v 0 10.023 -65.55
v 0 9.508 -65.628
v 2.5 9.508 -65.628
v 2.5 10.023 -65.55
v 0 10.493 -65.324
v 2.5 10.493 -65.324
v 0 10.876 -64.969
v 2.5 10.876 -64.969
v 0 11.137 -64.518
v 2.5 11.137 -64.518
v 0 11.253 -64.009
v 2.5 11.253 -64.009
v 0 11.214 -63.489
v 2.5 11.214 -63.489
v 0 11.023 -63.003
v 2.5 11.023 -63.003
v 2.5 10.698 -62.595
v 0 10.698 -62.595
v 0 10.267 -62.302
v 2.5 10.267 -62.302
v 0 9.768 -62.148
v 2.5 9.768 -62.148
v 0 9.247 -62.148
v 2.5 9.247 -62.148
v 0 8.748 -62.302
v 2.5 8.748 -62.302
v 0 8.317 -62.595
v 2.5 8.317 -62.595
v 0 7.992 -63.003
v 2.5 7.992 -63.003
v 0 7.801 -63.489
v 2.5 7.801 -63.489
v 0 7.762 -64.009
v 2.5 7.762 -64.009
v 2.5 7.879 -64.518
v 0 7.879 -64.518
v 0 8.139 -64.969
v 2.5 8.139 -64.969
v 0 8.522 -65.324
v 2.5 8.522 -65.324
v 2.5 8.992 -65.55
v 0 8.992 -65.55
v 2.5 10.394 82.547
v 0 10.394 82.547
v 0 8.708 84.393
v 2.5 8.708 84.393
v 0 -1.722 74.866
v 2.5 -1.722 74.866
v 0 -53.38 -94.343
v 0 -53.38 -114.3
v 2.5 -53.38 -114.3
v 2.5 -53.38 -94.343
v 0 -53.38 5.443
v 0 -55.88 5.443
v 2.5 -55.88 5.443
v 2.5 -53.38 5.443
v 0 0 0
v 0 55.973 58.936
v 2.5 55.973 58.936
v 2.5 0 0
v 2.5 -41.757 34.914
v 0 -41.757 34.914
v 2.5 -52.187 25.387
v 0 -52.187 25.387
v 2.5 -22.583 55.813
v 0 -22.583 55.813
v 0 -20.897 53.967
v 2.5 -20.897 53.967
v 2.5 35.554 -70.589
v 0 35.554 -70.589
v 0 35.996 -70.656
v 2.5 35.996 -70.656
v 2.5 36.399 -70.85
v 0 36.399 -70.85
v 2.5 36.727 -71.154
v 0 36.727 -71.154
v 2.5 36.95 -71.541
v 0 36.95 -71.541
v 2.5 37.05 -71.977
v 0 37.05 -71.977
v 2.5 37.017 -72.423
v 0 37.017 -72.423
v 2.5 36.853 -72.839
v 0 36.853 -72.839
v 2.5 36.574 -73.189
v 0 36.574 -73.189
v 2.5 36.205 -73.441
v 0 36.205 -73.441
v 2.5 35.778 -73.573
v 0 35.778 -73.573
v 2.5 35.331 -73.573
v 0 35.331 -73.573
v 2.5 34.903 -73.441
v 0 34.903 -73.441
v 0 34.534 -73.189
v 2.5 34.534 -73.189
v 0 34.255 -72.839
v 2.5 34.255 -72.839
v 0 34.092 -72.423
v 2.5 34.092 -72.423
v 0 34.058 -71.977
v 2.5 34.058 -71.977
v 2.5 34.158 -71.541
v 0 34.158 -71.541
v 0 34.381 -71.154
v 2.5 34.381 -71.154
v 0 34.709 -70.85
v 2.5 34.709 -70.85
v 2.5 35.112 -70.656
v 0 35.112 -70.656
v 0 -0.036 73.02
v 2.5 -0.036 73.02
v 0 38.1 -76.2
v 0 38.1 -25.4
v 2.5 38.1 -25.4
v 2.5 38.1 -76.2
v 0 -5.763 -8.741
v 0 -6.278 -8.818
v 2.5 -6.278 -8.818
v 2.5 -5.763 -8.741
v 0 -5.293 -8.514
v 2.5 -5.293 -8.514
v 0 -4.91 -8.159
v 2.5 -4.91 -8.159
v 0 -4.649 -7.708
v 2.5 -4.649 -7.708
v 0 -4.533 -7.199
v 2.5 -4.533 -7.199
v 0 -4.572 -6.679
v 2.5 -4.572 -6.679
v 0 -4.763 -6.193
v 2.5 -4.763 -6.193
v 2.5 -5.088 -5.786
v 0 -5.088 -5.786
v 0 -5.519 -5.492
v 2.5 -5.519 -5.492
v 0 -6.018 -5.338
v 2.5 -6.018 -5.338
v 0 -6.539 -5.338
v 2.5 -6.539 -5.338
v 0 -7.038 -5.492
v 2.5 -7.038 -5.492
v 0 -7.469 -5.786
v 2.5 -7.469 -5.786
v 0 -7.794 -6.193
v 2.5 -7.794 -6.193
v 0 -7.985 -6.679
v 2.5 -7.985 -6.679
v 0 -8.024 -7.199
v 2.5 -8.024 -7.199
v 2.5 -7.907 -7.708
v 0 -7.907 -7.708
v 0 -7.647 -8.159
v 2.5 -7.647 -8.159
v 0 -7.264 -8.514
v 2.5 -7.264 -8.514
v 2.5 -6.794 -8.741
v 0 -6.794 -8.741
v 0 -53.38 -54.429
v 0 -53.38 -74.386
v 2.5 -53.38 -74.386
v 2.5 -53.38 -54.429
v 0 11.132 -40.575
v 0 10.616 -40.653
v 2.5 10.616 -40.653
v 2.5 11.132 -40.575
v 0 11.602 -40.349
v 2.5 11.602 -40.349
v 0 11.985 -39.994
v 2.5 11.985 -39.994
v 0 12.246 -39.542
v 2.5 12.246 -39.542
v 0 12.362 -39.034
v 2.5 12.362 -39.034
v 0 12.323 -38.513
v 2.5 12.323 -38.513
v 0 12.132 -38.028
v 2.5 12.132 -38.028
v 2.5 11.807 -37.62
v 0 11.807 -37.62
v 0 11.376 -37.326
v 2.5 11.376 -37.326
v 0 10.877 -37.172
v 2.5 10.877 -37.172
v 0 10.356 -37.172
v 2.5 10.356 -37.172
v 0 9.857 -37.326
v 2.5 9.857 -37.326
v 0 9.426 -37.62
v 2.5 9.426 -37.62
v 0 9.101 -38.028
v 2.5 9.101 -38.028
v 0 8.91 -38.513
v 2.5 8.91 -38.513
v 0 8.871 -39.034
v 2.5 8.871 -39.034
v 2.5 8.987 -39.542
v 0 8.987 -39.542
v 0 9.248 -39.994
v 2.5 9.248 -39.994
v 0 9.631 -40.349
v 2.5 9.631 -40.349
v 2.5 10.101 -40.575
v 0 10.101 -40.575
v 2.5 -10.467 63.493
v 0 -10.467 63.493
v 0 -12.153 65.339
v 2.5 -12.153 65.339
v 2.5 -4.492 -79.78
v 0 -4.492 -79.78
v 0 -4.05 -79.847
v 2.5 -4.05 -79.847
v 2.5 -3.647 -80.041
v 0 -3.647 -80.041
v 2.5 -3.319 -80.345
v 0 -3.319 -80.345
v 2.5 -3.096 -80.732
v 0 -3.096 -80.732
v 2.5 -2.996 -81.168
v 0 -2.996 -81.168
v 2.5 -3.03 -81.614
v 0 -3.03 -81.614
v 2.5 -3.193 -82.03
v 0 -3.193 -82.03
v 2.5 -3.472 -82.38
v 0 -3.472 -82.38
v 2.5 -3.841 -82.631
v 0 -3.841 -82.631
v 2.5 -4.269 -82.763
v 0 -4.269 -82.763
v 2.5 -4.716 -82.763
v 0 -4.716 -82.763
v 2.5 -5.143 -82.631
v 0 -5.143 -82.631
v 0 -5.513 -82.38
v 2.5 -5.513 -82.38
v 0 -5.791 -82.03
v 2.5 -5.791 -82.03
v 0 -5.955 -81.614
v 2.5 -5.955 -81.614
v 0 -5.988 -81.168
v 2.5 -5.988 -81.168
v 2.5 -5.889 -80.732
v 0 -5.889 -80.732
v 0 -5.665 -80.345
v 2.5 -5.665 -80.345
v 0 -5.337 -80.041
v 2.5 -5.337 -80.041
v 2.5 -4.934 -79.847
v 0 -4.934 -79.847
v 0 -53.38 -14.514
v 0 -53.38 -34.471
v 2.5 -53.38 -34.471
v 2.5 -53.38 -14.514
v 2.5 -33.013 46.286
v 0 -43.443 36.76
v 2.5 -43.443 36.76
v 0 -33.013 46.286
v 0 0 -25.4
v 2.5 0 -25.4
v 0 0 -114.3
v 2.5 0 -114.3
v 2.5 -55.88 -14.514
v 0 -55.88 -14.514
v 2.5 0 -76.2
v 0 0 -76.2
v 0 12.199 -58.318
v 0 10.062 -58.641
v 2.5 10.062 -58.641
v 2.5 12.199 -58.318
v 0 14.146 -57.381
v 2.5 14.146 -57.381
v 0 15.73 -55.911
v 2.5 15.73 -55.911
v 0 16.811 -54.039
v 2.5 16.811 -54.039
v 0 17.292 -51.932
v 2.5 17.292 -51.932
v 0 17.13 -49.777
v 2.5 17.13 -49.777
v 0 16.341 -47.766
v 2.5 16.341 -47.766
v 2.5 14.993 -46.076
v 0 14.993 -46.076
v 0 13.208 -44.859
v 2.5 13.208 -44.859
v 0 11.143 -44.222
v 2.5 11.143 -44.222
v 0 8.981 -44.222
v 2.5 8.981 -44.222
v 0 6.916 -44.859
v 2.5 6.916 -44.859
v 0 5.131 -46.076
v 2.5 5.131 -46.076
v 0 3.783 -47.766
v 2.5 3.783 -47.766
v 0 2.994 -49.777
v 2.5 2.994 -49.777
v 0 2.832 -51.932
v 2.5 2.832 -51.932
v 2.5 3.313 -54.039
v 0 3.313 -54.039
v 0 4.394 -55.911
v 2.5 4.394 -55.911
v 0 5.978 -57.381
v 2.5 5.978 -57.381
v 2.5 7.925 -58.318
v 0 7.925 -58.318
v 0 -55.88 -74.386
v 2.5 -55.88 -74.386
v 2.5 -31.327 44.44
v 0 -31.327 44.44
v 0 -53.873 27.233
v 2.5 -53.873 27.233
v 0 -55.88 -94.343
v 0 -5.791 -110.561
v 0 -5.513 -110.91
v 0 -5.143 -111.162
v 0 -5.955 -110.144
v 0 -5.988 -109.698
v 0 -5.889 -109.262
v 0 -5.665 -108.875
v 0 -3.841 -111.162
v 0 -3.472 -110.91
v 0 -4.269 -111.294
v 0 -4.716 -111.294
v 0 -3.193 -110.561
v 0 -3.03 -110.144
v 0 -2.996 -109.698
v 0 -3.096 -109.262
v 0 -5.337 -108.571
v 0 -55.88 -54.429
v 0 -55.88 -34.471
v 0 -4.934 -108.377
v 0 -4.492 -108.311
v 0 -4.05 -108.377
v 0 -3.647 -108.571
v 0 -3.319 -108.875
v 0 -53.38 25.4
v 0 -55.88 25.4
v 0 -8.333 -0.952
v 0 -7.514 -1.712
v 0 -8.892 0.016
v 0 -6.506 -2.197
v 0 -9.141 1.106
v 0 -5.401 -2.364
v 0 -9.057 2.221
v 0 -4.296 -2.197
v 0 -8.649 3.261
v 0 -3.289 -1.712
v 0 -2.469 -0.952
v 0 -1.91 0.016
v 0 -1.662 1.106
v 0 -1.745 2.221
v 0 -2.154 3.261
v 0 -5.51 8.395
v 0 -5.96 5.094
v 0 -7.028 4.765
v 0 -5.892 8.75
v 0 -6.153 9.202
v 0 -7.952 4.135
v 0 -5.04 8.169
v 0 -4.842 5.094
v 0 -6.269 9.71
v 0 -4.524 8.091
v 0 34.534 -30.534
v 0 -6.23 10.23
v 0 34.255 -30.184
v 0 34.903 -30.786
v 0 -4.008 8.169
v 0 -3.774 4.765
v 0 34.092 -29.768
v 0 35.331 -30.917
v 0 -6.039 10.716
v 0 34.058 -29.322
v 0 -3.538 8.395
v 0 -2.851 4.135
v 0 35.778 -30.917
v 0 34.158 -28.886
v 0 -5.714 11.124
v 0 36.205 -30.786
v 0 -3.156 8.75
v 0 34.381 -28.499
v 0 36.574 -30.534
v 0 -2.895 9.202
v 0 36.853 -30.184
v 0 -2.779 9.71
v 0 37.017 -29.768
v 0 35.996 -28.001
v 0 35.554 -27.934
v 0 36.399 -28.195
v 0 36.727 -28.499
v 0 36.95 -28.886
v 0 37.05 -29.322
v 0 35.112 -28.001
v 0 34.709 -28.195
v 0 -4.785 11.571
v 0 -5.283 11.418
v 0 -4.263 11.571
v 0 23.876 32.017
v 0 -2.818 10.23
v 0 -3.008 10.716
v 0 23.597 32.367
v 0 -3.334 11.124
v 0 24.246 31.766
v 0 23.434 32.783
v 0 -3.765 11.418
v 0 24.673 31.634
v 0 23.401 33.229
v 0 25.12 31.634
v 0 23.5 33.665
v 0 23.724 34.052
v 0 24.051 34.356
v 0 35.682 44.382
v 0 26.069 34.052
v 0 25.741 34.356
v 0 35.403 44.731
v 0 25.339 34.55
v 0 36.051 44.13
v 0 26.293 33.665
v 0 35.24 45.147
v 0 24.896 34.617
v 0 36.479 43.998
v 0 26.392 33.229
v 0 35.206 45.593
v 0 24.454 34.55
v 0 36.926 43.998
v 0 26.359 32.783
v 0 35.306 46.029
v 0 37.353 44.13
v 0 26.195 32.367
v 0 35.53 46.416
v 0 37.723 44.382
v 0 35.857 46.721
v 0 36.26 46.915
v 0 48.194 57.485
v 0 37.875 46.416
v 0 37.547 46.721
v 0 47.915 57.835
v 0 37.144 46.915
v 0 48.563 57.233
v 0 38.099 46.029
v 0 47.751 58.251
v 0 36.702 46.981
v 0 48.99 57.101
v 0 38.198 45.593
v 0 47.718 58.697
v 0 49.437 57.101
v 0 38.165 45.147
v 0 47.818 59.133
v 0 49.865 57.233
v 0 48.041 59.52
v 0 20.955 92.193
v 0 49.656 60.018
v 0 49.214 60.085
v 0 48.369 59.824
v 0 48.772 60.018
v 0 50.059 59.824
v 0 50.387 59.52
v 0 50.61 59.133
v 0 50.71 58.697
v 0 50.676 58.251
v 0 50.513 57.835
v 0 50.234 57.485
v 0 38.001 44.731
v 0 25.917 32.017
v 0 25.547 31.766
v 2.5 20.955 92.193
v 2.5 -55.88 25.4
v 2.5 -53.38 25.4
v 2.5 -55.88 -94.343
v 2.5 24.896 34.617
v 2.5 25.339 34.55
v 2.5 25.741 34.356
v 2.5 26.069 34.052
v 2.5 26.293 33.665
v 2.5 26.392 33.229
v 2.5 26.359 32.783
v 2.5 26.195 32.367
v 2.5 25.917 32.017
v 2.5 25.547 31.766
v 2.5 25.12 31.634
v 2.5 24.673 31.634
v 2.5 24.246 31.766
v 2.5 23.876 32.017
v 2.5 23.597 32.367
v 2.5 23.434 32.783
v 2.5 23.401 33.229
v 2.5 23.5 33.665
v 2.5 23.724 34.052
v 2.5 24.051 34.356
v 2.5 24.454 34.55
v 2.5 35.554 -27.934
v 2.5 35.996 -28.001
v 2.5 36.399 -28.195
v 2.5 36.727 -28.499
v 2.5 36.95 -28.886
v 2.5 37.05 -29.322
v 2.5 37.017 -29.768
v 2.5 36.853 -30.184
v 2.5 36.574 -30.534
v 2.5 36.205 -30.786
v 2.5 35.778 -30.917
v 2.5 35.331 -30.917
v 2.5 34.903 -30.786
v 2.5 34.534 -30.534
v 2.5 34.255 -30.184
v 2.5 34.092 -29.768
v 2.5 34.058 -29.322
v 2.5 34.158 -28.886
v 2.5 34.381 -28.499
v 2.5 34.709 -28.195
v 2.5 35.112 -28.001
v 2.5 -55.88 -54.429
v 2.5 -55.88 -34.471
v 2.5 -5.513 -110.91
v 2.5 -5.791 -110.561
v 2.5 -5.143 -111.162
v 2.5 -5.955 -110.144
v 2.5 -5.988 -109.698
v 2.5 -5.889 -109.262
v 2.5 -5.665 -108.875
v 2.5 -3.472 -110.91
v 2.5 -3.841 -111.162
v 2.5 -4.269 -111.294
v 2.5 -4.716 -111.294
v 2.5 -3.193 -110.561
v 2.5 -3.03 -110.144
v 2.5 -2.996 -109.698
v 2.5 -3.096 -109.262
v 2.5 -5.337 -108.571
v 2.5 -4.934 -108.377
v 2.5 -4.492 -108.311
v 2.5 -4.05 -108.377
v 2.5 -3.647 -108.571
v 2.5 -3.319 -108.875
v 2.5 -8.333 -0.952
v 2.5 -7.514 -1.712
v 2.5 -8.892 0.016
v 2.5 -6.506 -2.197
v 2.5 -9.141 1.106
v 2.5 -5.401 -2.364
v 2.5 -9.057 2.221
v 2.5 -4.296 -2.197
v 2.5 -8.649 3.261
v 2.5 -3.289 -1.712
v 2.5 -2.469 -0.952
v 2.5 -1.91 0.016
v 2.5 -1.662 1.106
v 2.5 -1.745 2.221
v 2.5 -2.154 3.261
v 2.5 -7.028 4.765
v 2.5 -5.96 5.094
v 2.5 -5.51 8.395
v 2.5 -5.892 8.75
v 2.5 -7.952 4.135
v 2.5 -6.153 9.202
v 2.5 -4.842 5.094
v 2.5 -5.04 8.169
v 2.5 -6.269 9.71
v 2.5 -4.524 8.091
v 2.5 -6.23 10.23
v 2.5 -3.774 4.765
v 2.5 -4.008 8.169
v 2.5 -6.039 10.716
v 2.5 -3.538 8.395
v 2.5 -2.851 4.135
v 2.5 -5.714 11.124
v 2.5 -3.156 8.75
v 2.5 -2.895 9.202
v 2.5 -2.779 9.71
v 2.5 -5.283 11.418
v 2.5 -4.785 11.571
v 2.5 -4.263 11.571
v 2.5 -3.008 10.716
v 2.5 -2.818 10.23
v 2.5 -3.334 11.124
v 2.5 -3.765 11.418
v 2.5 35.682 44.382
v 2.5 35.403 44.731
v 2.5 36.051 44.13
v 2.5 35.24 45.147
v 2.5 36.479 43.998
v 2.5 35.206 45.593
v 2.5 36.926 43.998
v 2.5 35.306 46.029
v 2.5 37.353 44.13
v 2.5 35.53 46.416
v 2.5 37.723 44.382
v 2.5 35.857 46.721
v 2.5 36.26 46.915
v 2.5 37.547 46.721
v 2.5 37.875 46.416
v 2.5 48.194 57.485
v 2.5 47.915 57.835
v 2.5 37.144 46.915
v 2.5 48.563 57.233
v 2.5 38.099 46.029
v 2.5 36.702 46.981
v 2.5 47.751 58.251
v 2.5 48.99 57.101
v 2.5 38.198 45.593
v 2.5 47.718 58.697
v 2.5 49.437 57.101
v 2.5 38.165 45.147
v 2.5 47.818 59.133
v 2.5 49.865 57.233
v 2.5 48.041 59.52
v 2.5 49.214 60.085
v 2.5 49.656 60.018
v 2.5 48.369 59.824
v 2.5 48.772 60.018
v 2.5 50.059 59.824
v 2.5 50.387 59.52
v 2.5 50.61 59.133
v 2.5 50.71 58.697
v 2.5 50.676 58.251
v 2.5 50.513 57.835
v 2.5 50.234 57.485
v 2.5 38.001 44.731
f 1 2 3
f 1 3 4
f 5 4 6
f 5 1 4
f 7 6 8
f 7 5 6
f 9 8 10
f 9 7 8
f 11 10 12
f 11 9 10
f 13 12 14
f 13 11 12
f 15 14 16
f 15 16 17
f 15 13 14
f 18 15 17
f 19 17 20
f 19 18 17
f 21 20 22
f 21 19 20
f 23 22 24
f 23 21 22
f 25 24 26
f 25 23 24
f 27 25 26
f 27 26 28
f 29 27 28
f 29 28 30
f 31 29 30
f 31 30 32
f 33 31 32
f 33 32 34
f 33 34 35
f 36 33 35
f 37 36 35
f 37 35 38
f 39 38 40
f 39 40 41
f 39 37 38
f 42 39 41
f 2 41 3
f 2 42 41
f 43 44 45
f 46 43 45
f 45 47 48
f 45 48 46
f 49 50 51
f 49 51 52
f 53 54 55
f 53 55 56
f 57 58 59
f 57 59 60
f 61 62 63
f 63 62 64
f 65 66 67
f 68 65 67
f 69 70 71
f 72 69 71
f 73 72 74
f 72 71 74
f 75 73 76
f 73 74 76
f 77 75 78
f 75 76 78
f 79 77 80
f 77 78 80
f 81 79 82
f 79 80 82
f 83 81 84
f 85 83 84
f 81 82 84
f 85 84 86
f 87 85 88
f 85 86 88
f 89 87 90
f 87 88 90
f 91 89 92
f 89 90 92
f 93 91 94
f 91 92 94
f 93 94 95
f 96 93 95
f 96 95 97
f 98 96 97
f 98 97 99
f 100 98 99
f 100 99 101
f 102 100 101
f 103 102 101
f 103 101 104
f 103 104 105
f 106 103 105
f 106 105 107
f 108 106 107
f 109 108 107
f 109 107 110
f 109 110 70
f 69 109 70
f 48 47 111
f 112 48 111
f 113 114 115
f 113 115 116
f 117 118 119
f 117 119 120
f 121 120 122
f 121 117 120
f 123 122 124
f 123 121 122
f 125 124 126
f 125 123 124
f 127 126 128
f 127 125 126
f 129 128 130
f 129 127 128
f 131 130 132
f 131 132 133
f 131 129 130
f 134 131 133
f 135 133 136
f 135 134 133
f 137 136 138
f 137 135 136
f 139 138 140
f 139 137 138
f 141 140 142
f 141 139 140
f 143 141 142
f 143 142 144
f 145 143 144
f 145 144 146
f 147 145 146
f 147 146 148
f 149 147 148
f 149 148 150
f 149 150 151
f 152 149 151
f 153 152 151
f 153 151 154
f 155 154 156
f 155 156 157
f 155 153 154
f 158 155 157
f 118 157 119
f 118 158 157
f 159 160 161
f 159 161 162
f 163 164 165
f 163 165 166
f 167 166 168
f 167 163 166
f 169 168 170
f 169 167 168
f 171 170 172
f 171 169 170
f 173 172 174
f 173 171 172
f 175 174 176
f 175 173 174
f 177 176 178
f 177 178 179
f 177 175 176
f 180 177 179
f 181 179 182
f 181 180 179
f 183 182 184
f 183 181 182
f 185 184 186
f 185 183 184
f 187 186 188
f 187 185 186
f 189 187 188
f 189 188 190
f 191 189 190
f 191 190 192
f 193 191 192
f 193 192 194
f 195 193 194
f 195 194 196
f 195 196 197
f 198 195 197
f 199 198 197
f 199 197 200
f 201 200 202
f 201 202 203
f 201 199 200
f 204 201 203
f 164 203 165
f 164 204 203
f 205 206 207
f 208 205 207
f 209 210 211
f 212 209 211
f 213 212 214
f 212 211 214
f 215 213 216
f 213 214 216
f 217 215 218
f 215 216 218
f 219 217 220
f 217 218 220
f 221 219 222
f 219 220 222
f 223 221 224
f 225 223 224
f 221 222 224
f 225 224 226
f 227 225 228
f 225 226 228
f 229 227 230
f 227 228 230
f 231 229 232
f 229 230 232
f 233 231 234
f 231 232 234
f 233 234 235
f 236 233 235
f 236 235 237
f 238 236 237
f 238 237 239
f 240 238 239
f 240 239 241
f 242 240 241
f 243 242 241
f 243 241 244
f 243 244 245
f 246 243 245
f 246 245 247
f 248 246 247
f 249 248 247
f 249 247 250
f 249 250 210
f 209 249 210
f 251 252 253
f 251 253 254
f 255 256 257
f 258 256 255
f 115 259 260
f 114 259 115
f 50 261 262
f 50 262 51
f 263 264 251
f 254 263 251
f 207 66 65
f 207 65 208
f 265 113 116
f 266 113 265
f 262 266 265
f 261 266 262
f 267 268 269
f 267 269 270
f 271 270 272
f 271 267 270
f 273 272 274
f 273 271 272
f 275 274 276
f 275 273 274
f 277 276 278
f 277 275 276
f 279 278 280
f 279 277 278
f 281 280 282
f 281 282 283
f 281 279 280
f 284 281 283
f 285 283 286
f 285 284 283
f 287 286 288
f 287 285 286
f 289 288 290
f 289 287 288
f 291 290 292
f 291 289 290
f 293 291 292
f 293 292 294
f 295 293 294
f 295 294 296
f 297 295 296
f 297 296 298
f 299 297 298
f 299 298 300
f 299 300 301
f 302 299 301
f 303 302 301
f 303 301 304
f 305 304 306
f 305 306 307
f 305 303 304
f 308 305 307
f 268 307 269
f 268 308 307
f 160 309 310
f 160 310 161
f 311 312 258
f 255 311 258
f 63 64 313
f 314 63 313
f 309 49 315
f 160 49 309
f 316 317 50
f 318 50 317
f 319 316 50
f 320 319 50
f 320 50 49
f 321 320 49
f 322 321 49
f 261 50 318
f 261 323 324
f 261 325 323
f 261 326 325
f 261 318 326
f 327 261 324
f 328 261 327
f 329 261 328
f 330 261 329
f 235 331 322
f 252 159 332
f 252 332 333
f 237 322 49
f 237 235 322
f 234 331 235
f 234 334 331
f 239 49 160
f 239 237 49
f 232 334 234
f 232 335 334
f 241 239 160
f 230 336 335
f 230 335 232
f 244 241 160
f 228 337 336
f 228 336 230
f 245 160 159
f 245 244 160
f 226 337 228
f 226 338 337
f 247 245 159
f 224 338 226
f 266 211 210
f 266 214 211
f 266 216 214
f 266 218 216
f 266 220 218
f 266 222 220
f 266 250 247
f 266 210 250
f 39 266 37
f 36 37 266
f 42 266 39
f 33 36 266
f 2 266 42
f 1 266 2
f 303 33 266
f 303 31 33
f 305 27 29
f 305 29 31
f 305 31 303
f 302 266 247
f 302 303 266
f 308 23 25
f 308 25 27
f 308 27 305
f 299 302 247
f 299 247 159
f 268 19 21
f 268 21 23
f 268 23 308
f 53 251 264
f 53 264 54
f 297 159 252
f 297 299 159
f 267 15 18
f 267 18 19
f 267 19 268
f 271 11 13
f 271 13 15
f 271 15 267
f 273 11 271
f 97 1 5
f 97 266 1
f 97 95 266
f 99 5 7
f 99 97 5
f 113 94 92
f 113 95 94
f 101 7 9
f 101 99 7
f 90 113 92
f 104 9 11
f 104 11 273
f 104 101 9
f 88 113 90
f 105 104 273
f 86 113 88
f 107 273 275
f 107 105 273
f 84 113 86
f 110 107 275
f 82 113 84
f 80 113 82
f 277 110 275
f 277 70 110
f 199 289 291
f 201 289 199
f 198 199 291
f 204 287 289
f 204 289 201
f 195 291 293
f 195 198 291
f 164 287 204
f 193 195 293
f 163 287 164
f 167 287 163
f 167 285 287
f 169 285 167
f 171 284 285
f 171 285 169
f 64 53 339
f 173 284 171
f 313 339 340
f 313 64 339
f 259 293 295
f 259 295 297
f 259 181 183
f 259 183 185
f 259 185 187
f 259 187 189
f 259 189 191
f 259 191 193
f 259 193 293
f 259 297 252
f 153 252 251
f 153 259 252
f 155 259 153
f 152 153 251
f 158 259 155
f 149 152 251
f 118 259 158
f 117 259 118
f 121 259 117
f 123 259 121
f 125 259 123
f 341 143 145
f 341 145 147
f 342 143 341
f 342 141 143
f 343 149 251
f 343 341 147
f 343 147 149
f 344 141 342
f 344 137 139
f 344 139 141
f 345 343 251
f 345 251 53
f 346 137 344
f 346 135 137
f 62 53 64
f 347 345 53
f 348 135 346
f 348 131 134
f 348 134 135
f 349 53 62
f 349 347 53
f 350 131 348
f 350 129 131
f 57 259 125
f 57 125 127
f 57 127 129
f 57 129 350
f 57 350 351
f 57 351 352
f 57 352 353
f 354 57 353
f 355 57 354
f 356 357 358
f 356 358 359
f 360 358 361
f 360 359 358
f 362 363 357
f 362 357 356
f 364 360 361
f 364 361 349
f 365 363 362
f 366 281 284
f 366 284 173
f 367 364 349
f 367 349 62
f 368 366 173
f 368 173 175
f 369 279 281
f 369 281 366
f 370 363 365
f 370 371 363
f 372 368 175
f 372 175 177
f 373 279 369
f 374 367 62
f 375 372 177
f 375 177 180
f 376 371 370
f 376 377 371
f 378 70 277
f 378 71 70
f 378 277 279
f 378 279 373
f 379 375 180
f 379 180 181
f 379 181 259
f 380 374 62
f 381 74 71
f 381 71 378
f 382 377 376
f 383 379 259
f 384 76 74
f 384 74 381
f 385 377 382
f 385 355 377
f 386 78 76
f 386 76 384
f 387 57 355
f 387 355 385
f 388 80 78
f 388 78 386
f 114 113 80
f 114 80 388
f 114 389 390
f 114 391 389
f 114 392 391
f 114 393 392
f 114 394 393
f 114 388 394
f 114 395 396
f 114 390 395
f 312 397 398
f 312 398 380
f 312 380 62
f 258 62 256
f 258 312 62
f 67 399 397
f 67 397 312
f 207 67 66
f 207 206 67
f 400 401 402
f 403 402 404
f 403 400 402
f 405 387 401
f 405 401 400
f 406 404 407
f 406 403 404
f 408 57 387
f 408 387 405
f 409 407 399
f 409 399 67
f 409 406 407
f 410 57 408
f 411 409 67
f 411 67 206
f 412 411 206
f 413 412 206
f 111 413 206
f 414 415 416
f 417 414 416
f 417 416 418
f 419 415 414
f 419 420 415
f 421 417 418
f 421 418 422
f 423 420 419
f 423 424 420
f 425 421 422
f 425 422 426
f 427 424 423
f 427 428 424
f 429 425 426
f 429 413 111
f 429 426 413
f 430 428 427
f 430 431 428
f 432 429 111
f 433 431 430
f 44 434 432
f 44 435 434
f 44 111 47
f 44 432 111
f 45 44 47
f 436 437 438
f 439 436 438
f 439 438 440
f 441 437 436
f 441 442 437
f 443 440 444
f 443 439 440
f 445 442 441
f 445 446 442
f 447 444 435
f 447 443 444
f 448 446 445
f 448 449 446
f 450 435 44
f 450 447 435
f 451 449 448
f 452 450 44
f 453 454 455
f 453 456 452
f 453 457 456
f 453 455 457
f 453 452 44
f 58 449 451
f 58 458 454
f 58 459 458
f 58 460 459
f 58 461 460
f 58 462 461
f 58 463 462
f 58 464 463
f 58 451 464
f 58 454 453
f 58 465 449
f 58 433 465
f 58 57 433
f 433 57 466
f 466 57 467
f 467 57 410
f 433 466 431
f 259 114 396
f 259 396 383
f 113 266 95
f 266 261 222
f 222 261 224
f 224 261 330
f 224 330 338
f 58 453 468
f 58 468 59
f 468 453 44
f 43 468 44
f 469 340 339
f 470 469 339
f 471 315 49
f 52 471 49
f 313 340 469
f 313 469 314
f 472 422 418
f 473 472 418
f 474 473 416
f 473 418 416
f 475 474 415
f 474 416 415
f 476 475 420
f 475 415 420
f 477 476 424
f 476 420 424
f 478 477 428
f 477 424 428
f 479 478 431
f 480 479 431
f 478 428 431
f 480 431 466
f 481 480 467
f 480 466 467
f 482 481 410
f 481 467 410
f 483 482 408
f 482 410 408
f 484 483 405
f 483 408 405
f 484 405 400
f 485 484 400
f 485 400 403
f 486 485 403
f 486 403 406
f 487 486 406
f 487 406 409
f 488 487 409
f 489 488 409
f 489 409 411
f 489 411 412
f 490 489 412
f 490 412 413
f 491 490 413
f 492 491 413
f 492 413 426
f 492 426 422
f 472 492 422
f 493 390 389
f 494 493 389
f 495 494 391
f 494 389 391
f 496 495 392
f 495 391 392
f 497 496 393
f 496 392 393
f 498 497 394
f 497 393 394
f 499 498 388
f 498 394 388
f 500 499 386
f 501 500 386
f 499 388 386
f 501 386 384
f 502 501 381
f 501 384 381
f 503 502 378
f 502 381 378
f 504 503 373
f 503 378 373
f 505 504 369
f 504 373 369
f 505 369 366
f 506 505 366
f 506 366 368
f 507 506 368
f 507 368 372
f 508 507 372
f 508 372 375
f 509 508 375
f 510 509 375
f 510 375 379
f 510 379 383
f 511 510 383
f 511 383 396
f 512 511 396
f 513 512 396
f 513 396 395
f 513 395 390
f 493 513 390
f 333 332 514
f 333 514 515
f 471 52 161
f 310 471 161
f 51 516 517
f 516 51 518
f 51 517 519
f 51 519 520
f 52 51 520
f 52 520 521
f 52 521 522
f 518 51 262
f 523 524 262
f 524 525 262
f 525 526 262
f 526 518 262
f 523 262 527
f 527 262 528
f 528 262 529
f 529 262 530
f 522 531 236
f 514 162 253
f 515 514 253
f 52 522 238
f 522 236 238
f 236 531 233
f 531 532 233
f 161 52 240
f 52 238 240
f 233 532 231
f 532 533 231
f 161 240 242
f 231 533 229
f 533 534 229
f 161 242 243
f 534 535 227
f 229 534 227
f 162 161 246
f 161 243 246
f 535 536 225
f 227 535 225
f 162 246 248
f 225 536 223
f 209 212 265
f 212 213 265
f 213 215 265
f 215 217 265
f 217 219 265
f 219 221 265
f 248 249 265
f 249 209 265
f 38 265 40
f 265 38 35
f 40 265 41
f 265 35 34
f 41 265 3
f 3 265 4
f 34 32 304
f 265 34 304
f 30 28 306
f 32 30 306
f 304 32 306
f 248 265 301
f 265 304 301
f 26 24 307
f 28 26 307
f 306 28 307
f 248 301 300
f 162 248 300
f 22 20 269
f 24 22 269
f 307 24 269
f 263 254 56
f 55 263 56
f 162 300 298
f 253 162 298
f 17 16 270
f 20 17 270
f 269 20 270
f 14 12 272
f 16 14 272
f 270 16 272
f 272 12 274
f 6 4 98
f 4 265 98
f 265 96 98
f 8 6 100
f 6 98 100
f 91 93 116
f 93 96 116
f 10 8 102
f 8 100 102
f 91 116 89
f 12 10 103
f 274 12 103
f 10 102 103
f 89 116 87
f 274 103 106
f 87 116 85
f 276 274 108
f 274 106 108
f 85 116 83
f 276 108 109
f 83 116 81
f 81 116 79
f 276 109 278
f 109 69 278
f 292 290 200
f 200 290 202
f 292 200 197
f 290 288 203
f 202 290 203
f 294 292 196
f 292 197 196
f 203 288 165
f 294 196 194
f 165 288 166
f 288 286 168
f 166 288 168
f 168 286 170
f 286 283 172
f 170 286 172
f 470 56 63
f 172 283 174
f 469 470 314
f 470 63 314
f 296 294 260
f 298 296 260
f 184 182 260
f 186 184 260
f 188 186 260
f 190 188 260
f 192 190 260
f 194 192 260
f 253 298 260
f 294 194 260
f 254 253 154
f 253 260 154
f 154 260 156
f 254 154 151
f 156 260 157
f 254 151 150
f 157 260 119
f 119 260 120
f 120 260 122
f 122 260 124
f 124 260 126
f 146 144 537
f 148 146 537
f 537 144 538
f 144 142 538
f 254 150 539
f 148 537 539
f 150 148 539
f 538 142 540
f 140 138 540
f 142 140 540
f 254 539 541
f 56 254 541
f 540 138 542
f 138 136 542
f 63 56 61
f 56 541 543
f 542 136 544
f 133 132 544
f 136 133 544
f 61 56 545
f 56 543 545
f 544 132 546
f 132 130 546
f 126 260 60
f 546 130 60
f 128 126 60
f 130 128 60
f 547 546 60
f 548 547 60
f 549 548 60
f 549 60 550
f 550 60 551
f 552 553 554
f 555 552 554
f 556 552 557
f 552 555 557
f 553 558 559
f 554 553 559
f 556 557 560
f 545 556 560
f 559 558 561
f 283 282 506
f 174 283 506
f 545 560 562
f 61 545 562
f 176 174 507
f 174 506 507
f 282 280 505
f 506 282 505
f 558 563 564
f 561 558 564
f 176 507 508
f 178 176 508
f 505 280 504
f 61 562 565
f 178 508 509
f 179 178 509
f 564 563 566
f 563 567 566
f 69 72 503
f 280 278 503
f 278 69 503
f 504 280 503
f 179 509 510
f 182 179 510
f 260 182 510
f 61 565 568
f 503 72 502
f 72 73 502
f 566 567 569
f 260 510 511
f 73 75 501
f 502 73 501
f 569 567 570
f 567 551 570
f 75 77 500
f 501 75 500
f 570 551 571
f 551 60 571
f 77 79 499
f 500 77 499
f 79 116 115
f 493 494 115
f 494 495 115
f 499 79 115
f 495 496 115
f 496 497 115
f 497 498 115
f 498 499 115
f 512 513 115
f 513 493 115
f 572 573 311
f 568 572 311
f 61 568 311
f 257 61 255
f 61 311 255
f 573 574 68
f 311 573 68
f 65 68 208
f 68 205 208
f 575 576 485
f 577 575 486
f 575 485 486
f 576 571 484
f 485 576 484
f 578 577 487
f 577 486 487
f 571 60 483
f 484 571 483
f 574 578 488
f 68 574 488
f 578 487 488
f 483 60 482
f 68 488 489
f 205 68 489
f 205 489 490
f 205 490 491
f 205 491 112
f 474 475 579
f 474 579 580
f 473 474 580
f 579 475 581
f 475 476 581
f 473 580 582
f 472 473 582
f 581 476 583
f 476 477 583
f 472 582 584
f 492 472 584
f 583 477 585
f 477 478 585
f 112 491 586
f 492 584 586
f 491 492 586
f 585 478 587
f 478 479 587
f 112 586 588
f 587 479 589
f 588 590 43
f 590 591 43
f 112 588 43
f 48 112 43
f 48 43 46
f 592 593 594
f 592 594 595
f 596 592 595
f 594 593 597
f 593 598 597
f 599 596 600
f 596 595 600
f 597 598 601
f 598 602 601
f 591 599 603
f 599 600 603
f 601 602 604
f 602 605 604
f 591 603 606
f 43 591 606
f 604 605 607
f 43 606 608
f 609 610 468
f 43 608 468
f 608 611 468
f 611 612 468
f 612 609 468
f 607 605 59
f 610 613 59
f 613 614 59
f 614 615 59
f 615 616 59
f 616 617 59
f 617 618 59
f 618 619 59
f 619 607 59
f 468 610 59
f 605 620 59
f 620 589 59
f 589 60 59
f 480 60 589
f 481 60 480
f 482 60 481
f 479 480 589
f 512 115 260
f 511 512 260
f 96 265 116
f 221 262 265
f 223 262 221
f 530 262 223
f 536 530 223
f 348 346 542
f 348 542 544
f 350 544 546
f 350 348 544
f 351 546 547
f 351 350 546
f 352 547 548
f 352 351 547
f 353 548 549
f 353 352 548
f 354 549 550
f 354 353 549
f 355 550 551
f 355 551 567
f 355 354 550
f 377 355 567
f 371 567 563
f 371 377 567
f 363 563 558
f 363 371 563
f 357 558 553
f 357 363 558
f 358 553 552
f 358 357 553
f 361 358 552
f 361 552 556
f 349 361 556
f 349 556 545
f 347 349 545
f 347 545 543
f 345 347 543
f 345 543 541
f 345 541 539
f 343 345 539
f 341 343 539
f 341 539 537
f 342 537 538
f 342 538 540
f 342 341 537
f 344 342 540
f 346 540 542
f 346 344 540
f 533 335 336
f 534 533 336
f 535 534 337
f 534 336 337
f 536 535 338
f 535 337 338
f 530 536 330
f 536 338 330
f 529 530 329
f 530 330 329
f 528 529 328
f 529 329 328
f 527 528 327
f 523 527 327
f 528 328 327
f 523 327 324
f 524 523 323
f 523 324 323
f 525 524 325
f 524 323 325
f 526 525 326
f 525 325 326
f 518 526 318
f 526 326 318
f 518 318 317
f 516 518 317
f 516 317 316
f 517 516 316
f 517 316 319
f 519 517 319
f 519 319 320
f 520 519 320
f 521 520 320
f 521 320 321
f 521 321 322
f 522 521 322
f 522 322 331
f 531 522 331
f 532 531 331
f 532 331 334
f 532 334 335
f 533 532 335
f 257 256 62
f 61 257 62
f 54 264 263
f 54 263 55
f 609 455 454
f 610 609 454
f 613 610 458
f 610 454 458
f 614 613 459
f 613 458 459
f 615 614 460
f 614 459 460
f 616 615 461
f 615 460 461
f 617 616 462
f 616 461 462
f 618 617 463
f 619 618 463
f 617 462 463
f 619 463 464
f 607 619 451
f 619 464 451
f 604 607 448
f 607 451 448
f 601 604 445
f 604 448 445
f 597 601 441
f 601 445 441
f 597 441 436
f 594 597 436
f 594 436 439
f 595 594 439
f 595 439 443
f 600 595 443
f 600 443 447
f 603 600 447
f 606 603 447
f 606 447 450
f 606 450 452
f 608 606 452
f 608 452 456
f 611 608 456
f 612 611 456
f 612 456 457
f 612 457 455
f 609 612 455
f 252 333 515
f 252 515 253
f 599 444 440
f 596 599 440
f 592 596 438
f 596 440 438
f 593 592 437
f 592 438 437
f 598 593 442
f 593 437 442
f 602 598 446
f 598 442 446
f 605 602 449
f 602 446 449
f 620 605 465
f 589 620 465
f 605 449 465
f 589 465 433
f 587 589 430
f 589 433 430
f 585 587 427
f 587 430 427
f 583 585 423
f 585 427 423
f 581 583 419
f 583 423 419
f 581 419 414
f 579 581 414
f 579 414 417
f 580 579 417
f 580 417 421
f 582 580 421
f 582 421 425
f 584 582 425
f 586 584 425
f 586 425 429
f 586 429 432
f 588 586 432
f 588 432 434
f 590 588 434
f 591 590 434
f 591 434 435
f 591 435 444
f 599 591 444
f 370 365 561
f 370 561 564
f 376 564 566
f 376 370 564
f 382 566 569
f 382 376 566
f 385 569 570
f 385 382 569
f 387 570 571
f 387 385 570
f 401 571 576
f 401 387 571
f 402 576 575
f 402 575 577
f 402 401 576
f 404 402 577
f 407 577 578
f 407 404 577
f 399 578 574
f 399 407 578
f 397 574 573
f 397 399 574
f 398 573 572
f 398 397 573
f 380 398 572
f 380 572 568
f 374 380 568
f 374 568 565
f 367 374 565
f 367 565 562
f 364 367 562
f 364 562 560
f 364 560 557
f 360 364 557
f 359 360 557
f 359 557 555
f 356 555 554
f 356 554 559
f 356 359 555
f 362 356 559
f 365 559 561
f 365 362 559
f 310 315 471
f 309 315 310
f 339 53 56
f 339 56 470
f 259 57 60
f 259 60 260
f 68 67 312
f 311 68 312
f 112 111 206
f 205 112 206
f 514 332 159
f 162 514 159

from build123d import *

# Parameters (mm, degrees)
SKETCH1_R           = 1.75
SKETCH1_R_2         = 3.75
SKETCH1_R_3         = 7.25
BOSS_EXTRUDE1_DEPTH = 2.5
SKETCH2_R           = 1.5
CUT_EXTRUDE1_DEPTH  = 45.72
SKETCH3_W           = 19.957142857
SKETCH3_H           = 2.5
CUT_EXTRUDE2_DEPTH  = 2.54
CUT_EXTRUDE3_DEPTH  = 2.54


with BuildPart() as part:
    # Sketch1 → Boss-Extrude1 (new body)
    with BuildSketch(Plane(origin=(0, 0, 0), x_dir=(0, 0, -1), z_dir=(1, 0, 0))):
        Polygon((0, 0), (25.4, 0), (25.4, 38.1), (76.2, 38.1), (76.2, 0), (114.3, 0), (114.3, -55.88), (-25.4, -55.88), (-93.919230144, 19.137831884), (-58.936151167, 55.972926363), align=None)
        with Locations((-9.840865869, -4.523881045)):
            Circle(SKETCH1_R, mode=Mode.SUBTRACT)
        with Locations((-1.386257564, -5.40114863)):
            Circle(SKETCH1_R_2, mode=Mode.SUBTRACT)
        with Locations((7.06835074, -6.278416216)):
            Circle(SKETCH1_R, mode=Mode.SUBTRACT)
        with Locations((51.390541055, 10.062014111)):
            Circle(SKETCH1_R_3, mode=Mode.SUBTRACT)
        with Locations((38.902844079, 10.616472631)):
            Circle(SKETCH1_R, mode=Mode.SUBTRACT)
        with Locations((63.87823803, 9.507555591)):
            Circle(SKETCH1_R, mode=Mode.SUBTRACT)
    extrude(amount=BOSS_EXTRUDE1_DEPTH)

    # Sketch2 → Cut-Extrude1 (cut)
    with BuildSketch(Plane.ZY):
        with Locations((-72.089288217, 35.554137698)):
            Circle(SKETCH2_R)
        with Locations((-29.434072146, 35.554137698)):
            Circle(SKETCH2_R)
        with Locations((-109.810505414, -4.492241592)):
            Circle(SKETCH2_R)
        with Locations((-81.28, -4.492241592)):
            Circle(SKETCH2_R)
        with Locations((58.584658566, 49.213818775)):
            Circle(SKETCH2_R)
        with Locations((45.481260754, 36.702251461)):
            Circle(SKETCH2_R)
        with Locations((33.116955359, 24.896394578)):
            Circle(SKETCH2_R)
    extrude(amount=-CUT_EXTRUDE1_DEPTH, mode=Mode.SUBTRACT)

    # Sketch3 → Cut-Extrude2 (cut)
    with BuildSketch(Plane.ZY):
        with Locations((-104.321428572, -54.63)):
            Rectangle(SKETCH3_W, SKETCH3_H)
        with Locations((-64.407142858, -54.63)):
            Rectangle(SKETCH3_W, SKETCH3_H)
        with Locations((-24.492857143, -54.63)):
            Rectangle(SKETCH3_W, SKETCH3_H)
        with Locations((15.421428572, -54.63)):
            Rectangle(SKETCH3_W, SKETCH3_H)
    extrude(amount=-CUT_EXTRUDE2_DEPTH, mode=Mode.SUBTRACT)

    # Sketch4 → Cut-Extrude3 (cut)
    with BuildSketch(Plane.ZY):
        Polygon((27.232932154, -53.873226195), (36.759546153, -43.443075041), (34.913634935, -41.757070362), (25.387020937, -52.187221516), align=None)
        Polygon((44.440248934, -31.326919208), (46.286160151, -33.012923887), (55.81277415, -22.582772733), (53.966862932, -20.896768054), align=None)
        Polygon((63.493476931, -10.4666169), (65.339388148, -12.152621579), (74.866002147, -1.722470425), (73.020090929, -0.036465746), align=None)
        Polygon((82.546704928, 10.393685408), (84.392616145, 8.70768073), (93.919230144, 19.137831884), (92.193270327, 20.955164571), align=None)
    extrude(amount=-CUT_EXTRUDE3_DEPTH, mode=Mode.SUBTRACT)


solid = part.part
